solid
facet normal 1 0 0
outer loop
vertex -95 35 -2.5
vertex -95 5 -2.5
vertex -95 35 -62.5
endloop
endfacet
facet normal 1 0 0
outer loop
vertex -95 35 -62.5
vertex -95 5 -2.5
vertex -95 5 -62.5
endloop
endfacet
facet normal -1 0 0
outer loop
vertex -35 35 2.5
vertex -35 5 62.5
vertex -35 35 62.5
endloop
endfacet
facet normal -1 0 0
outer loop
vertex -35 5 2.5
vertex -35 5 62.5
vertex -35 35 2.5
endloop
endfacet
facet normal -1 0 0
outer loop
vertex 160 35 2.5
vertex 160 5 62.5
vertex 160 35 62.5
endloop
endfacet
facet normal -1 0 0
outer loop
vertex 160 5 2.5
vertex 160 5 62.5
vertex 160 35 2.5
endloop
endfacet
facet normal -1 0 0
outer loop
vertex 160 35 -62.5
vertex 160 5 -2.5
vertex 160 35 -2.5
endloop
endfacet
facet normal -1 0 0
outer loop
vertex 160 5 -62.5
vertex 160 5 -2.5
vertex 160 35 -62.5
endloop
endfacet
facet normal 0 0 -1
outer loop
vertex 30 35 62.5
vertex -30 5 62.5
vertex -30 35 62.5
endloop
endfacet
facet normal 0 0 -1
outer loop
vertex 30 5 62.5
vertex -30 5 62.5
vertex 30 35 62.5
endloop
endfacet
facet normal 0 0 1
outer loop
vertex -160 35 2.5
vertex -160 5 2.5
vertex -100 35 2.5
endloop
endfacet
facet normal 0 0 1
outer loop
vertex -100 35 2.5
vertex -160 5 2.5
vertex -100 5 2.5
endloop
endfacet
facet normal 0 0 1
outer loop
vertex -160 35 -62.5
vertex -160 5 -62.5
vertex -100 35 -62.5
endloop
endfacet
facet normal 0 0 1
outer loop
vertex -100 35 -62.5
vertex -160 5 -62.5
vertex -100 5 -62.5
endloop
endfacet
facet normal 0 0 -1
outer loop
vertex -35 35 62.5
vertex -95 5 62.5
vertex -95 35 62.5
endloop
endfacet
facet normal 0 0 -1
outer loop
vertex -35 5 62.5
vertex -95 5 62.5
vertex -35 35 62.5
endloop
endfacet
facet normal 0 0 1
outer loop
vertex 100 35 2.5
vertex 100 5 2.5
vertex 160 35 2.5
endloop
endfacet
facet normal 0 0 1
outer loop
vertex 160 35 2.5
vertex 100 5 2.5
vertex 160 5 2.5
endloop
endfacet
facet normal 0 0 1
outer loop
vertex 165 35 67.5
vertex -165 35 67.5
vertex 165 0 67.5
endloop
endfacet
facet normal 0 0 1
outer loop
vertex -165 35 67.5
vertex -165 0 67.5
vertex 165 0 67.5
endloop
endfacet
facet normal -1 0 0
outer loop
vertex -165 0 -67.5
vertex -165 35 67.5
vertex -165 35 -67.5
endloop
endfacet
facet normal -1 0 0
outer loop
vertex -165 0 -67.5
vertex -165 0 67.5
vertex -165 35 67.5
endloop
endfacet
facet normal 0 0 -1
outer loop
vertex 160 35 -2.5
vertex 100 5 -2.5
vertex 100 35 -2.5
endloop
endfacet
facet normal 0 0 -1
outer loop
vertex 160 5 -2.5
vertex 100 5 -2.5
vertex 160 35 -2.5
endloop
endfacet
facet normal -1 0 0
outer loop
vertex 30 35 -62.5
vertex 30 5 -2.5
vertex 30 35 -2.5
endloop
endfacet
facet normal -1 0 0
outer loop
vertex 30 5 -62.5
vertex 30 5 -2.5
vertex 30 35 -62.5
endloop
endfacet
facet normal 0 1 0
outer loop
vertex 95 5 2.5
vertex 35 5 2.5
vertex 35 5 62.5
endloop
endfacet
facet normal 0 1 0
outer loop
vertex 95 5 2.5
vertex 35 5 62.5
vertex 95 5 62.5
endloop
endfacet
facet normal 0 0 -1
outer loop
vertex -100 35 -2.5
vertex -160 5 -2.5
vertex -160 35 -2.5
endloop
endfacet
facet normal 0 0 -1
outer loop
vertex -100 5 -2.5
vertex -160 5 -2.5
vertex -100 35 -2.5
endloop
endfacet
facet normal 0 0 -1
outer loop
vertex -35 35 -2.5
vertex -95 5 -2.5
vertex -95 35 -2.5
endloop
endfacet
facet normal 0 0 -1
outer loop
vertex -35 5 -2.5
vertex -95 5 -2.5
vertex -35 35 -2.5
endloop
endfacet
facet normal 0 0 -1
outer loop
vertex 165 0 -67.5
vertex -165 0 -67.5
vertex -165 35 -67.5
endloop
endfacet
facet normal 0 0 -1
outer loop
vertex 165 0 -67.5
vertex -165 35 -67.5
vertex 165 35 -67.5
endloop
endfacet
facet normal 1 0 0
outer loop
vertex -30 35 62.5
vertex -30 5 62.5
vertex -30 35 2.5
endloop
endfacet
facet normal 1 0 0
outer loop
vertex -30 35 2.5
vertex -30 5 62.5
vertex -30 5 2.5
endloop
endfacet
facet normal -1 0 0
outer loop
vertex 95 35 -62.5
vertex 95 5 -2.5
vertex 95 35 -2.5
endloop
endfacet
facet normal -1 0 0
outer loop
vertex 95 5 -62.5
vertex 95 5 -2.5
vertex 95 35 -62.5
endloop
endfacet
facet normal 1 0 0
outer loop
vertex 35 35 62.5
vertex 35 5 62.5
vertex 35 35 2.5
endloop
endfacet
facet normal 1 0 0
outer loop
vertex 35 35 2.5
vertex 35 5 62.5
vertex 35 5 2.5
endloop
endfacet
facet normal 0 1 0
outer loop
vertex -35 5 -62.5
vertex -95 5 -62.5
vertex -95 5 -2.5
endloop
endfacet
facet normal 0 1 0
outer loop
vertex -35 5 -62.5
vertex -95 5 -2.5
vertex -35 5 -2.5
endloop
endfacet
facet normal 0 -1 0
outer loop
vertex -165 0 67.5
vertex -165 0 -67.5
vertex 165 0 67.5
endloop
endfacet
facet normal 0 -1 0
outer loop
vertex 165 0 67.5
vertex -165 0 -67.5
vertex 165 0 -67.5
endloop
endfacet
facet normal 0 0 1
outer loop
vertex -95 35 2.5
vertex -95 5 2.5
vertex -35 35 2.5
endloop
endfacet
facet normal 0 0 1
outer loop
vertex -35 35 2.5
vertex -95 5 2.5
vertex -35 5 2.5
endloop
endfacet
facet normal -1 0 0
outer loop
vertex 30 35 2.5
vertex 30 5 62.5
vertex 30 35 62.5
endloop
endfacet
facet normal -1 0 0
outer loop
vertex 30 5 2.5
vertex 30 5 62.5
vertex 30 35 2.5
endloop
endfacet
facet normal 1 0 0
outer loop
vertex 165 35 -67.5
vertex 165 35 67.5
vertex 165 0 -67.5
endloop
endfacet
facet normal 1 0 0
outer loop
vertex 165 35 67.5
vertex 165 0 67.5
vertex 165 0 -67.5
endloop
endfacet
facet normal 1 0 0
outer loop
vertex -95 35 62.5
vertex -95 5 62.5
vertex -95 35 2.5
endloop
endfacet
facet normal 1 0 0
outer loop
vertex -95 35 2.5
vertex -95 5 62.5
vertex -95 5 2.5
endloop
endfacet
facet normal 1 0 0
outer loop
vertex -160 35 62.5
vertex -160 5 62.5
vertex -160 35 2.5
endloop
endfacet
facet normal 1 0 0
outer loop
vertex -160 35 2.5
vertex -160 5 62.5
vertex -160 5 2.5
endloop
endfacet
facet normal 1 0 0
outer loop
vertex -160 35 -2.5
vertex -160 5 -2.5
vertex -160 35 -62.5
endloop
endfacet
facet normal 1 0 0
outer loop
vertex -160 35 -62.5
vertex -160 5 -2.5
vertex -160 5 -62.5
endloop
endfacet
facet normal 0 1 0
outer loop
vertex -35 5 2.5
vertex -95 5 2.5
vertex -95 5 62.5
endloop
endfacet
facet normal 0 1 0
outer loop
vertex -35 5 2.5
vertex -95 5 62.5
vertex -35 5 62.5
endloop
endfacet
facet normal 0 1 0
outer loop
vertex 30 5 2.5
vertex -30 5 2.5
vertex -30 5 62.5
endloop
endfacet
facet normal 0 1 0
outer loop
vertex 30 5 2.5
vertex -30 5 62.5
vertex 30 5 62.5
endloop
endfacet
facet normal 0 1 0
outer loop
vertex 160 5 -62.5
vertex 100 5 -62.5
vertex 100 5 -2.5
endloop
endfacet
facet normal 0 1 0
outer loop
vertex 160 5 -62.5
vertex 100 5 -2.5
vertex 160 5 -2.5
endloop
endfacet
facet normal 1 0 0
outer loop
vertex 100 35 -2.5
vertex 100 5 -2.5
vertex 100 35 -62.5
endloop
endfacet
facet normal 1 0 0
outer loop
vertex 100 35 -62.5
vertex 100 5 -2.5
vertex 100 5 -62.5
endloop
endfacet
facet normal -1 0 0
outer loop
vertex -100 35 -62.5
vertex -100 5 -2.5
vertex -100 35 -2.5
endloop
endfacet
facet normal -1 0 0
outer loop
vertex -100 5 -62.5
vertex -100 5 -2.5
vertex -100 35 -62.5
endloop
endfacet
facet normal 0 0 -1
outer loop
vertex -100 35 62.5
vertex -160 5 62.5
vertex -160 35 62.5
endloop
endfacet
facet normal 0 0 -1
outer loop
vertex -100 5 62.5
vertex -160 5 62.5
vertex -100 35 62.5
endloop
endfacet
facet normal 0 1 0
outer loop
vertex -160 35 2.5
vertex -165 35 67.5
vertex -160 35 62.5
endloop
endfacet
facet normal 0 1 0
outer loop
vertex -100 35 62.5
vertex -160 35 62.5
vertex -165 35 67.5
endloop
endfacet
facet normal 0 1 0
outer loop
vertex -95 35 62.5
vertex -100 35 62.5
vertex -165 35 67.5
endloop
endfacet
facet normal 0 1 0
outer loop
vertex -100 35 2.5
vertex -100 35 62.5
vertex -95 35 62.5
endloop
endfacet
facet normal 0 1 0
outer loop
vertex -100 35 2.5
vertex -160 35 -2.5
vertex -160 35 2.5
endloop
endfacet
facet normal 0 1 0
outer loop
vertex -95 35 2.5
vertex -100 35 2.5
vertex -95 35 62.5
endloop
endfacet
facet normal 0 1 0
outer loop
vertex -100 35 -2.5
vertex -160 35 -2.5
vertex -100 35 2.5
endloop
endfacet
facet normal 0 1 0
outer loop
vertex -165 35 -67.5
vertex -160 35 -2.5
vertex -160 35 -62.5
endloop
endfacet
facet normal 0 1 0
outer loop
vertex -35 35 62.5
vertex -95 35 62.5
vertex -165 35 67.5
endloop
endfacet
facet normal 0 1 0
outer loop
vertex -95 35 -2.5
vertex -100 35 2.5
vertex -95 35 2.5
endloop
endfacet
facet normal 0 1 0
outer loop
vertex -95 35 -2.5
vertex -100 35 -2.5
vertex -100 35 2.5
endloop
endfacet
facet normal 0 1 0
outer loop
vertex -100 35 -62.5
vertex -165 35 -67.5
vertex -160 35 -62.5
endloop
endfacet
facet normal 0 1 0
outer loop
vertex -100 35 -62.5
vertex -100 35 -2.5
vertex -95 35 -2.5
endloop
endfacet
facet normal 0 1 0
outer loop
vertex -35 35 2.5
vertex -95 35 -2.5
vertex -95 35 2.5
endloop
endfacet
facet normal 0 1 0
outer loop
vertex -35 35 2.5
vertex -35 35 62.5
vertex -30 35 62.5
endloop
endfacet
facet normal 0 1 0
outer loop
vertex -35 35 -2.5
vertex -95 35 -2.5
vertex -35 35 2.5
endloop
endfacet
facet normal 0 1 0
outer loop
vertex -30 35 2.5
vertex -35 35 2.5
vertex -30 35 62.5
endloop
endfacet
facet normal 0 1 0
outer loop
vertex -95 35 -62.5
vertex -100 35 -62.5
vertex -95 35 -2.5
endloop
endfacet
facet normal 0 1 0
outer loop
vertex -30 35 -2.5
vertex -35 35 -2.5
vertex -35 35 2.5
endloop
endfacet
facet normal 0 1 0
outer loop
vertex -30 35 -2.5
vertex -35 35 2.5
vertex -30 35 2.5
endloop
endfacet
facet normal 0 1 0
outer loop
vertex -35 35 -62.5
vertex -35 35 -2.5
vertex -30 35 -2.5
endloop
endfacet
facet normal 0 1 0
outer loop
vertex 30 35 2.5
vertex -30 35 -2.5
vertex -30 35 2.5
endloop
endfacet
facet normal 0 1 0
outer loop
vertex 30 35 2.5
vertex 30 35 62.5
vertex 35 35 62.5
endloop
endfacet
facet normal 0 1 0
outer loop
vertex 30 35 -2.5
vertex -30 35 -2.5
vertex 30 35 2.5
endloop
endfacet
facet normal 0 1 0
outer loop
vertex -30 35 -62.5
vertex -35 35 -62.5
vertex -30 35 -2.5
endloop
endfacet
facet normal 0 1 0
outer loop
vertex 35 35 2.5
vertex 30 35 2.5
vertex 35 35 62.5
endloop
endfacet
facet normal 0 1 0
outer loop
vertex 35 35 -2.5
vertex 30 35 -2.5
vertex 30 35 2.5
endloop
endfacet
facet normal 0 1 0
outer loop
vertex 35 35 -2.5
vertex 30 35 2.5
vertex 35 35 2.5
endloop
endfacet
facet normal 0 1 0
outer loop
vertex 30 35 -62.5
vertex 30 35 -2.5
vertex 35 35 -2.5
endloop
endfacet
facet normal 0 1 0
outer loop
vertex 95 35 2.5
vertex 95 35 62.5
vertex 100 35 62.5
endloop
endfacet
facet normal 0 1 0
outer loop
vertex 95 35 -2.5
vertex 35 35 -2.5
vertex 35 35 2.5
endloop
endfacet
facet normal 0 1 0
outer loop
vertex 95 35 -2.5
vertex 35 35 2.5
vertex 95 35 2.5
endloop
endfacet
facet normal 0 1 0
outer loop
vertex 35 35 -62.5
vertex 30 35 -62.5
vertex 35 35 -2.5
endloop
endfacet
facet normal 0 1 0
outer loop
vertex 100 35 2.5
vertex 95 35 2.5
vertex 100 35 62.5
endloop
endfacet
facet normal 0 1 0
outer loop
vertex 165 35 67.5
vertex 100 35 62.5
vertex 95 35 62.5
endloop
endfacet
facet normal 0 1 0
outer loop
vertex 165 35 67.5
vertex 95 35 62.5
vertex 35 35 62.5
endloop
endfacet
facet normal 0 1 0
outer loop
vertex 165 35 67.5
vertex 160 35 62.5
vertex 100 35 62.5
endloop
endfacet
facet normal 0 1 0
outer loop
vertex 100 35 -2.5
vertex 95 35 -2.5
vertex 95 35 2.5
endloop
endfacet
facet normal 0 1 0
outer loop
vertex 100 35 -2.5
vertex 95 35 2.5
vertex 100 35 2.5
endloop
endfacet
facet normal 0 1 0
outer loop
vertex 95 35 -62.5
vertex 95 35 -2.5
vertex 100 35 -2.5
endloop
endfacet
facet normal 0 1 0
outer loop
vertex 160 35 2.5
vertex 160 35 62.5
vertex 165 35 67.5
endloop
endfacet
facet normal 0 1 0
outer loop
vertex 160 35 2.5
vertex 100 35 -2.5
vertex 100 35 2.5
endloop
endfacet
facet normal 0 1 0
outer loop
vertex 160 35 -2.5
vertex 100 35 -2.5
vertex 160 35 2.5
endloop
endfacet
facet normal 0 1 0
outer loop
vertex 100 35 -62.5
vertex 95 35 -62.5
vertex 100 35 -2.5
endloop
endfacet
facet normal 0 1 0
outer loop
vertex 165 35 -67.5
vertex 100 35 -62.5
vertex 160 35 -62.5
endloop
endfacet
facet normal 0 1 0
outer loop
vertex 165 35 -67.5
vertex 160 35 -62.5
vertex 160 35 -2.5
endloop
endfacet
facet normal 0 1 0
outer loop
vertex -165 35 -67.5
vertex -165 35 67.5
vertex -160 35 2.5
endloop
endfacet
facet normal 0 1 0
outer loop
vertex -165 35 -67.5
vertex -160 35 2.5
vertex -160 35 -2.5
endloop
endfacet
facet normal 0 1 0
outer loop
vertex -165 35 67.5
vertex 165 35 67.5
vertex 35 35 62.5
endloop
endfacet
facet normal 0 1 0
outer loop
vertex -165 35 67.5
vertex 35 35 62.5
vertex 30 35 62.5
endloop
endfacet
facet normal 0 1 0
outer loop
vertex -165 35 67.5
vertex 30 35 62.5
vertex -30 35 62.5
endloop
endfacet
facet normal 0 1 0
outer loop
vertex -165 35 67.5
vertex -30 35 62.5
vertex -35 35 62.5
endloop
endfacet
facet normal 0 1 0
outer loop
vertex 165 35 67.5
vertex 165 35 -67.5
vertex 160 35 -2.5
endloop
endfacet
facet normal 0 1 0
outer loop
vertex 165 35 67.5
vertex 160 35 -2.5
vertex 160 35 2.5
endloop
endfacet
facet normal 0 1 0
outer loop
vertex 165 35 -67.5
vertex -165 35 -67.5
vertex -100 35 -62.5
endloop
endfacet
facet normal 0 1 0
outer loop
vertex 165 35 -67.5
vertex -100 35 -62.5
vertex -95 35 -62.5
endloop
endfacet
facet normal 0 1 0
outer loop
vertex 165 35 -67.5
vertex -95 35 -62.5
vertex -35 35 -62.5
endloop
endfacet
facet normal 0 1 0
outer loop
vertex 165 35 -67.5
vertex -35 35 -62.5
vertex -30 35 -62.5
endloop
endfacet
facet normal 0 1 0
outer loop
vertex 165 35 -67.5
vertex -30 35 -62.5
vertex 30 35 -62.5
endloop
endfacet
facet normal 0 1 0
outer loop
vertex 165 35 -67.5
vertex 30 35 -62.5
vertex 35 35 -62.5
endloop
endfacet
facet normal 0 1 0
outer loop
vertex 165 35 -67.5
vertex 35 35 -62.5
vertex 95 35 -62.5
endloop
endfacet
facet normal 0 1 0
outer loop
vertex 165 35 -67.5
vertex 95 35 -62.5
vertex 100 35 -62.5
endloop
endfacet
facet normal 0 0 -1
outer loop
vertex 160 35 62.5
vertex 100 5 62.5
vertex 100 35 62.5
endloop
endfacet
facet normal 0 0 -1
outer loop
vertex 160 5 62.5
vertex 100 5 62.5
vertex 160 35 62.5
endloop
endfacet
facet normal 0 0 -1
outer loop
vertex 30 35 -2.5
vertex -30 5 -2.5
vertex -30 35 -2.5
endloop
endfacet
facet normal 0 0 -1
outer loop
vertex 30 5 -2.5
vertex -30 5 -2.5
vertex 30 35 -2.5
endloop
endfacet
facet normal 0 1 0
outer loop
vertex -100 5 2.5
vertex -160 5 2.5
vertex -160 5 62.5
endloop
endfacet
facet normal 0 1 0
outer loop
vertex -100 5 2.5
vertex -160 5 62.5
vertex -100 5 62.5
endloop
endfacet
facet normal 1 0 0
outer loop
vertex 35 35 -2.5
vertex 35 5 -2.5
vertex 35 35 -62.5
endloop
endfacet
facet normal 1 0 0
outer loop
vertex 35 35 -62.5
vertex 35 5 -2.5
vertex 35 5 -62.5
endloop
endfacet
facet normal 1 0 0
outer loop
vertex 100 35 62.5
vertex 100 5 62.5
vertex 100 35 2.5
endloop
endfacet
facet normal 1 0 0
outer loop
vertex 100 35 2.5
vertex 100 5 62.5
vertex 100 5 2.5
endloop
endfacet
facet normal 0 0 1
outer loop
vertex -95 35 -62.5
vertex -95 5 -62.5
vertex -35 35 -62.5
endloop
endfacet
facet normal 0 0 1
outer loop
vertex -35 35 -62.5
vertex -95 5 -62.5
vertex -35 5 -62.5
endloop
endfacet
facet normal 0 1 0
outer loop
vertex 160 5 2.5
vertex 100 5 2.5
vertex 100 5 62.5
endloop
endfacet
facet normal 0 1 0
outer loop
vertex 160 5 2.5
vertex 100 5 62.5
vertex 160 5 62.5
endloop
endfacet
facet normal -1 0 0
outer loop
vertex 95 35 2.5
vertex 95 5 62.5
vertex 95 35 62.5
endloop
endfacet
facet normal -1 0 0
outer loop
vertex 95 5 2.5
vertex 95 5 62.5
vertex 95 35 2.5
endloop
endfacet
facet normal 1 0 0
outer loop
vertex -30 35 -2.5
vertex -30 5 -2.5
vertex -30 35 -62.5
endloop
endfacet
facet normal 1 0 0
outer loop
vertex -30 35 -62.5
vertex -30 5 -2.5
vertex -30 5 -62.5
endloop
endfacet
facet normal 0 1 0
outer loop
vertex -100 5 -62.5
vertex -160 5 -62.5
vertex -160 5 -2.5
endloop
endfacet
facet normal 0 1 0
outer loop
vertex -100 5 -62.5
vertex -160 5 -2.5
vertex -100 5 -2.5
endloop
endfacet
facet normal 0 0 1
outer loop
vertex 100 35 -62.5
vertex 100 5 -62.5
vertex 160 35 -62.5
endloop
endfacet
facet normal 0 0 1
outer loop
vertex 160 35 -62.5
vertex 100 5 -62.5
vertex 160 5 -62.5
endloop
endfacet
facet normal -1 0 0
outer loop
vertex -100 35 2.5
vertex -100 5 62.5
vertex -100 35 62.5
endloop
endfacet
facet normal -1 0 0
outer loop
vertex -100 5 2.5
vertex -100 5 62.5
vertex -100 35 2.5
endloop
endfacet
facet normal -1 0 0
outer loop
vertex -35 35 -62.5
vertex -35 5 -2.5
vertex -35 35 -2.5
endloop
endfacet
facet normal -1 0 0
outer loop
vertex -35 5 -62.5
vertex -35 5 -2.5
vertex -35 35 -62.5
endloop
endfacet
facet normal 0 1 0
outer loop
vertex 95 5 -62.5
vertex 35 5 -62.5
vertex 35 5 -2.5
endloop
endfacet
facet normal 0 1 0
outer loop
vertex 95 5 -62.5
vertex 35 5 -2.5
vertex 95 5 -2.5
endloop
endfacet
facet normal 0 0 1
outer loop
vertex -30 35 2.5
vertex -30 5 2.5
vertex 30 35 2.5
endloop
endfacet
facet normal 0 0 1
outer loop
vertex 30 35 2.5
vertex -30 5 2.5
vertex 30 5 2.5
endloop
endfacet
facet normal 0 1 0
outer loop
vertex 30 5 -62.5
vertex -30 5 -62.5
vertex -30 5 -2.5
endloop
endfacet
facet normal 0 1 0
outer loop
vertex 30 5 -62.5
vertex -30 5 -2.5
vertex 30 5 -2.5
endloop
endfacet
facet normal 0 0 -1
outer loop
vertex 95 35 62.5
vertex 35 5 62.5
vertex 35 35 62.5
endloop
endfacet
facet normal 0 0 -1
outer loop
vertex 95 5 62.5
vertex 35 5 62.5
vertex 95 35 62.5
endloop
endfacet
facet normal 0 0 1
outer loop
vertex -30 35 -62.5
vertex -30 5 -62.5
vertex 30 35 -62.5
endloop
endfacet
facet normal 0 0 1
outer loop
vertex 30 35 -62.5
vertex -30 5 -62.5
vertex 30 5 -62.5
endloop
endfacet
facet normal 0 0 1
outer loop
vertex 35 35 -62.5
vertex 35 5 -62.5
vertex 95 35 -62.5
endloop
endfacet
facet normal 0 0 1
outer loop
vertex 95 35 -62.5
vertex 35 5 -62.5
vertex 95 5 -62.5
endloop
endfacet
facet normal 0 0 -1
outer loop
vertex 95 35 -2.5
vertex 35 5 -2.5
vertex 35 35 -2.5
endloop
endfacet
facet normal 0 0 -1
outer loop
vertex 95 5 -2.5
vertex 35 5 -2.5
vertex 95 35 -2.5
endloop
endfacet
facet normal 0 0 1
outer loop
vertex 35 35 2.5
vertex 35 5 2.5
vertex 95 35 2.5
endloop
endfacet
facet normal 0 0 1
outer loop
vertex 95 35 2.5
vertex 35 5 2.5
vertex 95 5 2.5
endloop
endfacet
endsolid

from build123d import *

# Parameters (mm, degrees)
CROQUIS1_W              = 330
CROQUIS1_H              = 135
SALIENTE_EXTRUIR1_DEPTH = 5
CROQUIS2_W              = 330
CROQUIS2_H              = 135
CROQUIS2_W_2            = 60
CROQUIS2_H_2            = 60
SALIENTE_EXTRUIR2_DEPTH = 30


with BuildPart() as part:
    # Croquis1 → Saliente-Extruir1 (new body)
    with BuildSketch(Plane(origin=(0, 0, 0), x_dir=(1, 0, 0), z_dir=(0, 1, 0))):
        Rectangle(CROQUIS1_W, CROQUIS1_H)
    extrude(amount=SALIENTE_EXTRUIR1_DEPTH)

    # Croquis2 → Saliente-Extruir2 (add)
    with BuildSketch(Plane(origin=(0, 5, 0), x_dir=(1, 0, 0), z_dir=(0, 1, 0))):
        Rectangle(CROQUIS2_W, CROQUIS2_H)
        with Locations((-130, 32.5)):
            Rectangle(CROQUIS2_W_2, CROQUIS2_H_2, mode=Mode.SUBTRACT)
        with Locations((-65, 32.5)):
            Rectangle(CROQUIS2_W_2, CROQUIS2_H_2, mode=Mode.SUBTRACT)
        with Locations((0, 32.5)):
            Rectangle(CROQUIS2_W_2, CROQUIS2_H_2, mode=Mode.SUBTRACT)
        with Locations((65, 32.5)):
            Rectangle(CROQUIS2_W_2, CROQUIS2_H_2, mode=Mode.SUBTRACT)
        with Locations((130, 32.5)):
            Rectangle(CROQUIS2_W_2, CROQUIS2_H_2, mode=Mode.SUBTRACT)
        with Locations((-130, -32.5)):
            Rectangle(CROQUIS2_W_2, CROQUIS2_H_2, mode=Mode.SUBTRACT)
        with Locations((-65, -32.5)):
            Rectangle(CROQUIS2_W_2, CROQUIS2_H_2, mode=Mode.SUBTRACT)
        with Locations((0, -32.5)):
            Rectangle(CROQUIS2_W_2, CROQUIS2_H_2, mode=Mode.SUBTRACT)
        with Locations((65, -32.5)):
            Rectangle(CROQUIS2_W_2, CROQUIS2_H_2, mode=Mode.SUBTRACT)
        with Locations((130, -32.5)):
            Rectangle(CROQUIS2_W_2, CROQUIS2_H_2, mode=Mode.SUBTRACT)
    extrude(amount=SALIENTE_EXTRUIR2_DEPTH)


solid = part.part
